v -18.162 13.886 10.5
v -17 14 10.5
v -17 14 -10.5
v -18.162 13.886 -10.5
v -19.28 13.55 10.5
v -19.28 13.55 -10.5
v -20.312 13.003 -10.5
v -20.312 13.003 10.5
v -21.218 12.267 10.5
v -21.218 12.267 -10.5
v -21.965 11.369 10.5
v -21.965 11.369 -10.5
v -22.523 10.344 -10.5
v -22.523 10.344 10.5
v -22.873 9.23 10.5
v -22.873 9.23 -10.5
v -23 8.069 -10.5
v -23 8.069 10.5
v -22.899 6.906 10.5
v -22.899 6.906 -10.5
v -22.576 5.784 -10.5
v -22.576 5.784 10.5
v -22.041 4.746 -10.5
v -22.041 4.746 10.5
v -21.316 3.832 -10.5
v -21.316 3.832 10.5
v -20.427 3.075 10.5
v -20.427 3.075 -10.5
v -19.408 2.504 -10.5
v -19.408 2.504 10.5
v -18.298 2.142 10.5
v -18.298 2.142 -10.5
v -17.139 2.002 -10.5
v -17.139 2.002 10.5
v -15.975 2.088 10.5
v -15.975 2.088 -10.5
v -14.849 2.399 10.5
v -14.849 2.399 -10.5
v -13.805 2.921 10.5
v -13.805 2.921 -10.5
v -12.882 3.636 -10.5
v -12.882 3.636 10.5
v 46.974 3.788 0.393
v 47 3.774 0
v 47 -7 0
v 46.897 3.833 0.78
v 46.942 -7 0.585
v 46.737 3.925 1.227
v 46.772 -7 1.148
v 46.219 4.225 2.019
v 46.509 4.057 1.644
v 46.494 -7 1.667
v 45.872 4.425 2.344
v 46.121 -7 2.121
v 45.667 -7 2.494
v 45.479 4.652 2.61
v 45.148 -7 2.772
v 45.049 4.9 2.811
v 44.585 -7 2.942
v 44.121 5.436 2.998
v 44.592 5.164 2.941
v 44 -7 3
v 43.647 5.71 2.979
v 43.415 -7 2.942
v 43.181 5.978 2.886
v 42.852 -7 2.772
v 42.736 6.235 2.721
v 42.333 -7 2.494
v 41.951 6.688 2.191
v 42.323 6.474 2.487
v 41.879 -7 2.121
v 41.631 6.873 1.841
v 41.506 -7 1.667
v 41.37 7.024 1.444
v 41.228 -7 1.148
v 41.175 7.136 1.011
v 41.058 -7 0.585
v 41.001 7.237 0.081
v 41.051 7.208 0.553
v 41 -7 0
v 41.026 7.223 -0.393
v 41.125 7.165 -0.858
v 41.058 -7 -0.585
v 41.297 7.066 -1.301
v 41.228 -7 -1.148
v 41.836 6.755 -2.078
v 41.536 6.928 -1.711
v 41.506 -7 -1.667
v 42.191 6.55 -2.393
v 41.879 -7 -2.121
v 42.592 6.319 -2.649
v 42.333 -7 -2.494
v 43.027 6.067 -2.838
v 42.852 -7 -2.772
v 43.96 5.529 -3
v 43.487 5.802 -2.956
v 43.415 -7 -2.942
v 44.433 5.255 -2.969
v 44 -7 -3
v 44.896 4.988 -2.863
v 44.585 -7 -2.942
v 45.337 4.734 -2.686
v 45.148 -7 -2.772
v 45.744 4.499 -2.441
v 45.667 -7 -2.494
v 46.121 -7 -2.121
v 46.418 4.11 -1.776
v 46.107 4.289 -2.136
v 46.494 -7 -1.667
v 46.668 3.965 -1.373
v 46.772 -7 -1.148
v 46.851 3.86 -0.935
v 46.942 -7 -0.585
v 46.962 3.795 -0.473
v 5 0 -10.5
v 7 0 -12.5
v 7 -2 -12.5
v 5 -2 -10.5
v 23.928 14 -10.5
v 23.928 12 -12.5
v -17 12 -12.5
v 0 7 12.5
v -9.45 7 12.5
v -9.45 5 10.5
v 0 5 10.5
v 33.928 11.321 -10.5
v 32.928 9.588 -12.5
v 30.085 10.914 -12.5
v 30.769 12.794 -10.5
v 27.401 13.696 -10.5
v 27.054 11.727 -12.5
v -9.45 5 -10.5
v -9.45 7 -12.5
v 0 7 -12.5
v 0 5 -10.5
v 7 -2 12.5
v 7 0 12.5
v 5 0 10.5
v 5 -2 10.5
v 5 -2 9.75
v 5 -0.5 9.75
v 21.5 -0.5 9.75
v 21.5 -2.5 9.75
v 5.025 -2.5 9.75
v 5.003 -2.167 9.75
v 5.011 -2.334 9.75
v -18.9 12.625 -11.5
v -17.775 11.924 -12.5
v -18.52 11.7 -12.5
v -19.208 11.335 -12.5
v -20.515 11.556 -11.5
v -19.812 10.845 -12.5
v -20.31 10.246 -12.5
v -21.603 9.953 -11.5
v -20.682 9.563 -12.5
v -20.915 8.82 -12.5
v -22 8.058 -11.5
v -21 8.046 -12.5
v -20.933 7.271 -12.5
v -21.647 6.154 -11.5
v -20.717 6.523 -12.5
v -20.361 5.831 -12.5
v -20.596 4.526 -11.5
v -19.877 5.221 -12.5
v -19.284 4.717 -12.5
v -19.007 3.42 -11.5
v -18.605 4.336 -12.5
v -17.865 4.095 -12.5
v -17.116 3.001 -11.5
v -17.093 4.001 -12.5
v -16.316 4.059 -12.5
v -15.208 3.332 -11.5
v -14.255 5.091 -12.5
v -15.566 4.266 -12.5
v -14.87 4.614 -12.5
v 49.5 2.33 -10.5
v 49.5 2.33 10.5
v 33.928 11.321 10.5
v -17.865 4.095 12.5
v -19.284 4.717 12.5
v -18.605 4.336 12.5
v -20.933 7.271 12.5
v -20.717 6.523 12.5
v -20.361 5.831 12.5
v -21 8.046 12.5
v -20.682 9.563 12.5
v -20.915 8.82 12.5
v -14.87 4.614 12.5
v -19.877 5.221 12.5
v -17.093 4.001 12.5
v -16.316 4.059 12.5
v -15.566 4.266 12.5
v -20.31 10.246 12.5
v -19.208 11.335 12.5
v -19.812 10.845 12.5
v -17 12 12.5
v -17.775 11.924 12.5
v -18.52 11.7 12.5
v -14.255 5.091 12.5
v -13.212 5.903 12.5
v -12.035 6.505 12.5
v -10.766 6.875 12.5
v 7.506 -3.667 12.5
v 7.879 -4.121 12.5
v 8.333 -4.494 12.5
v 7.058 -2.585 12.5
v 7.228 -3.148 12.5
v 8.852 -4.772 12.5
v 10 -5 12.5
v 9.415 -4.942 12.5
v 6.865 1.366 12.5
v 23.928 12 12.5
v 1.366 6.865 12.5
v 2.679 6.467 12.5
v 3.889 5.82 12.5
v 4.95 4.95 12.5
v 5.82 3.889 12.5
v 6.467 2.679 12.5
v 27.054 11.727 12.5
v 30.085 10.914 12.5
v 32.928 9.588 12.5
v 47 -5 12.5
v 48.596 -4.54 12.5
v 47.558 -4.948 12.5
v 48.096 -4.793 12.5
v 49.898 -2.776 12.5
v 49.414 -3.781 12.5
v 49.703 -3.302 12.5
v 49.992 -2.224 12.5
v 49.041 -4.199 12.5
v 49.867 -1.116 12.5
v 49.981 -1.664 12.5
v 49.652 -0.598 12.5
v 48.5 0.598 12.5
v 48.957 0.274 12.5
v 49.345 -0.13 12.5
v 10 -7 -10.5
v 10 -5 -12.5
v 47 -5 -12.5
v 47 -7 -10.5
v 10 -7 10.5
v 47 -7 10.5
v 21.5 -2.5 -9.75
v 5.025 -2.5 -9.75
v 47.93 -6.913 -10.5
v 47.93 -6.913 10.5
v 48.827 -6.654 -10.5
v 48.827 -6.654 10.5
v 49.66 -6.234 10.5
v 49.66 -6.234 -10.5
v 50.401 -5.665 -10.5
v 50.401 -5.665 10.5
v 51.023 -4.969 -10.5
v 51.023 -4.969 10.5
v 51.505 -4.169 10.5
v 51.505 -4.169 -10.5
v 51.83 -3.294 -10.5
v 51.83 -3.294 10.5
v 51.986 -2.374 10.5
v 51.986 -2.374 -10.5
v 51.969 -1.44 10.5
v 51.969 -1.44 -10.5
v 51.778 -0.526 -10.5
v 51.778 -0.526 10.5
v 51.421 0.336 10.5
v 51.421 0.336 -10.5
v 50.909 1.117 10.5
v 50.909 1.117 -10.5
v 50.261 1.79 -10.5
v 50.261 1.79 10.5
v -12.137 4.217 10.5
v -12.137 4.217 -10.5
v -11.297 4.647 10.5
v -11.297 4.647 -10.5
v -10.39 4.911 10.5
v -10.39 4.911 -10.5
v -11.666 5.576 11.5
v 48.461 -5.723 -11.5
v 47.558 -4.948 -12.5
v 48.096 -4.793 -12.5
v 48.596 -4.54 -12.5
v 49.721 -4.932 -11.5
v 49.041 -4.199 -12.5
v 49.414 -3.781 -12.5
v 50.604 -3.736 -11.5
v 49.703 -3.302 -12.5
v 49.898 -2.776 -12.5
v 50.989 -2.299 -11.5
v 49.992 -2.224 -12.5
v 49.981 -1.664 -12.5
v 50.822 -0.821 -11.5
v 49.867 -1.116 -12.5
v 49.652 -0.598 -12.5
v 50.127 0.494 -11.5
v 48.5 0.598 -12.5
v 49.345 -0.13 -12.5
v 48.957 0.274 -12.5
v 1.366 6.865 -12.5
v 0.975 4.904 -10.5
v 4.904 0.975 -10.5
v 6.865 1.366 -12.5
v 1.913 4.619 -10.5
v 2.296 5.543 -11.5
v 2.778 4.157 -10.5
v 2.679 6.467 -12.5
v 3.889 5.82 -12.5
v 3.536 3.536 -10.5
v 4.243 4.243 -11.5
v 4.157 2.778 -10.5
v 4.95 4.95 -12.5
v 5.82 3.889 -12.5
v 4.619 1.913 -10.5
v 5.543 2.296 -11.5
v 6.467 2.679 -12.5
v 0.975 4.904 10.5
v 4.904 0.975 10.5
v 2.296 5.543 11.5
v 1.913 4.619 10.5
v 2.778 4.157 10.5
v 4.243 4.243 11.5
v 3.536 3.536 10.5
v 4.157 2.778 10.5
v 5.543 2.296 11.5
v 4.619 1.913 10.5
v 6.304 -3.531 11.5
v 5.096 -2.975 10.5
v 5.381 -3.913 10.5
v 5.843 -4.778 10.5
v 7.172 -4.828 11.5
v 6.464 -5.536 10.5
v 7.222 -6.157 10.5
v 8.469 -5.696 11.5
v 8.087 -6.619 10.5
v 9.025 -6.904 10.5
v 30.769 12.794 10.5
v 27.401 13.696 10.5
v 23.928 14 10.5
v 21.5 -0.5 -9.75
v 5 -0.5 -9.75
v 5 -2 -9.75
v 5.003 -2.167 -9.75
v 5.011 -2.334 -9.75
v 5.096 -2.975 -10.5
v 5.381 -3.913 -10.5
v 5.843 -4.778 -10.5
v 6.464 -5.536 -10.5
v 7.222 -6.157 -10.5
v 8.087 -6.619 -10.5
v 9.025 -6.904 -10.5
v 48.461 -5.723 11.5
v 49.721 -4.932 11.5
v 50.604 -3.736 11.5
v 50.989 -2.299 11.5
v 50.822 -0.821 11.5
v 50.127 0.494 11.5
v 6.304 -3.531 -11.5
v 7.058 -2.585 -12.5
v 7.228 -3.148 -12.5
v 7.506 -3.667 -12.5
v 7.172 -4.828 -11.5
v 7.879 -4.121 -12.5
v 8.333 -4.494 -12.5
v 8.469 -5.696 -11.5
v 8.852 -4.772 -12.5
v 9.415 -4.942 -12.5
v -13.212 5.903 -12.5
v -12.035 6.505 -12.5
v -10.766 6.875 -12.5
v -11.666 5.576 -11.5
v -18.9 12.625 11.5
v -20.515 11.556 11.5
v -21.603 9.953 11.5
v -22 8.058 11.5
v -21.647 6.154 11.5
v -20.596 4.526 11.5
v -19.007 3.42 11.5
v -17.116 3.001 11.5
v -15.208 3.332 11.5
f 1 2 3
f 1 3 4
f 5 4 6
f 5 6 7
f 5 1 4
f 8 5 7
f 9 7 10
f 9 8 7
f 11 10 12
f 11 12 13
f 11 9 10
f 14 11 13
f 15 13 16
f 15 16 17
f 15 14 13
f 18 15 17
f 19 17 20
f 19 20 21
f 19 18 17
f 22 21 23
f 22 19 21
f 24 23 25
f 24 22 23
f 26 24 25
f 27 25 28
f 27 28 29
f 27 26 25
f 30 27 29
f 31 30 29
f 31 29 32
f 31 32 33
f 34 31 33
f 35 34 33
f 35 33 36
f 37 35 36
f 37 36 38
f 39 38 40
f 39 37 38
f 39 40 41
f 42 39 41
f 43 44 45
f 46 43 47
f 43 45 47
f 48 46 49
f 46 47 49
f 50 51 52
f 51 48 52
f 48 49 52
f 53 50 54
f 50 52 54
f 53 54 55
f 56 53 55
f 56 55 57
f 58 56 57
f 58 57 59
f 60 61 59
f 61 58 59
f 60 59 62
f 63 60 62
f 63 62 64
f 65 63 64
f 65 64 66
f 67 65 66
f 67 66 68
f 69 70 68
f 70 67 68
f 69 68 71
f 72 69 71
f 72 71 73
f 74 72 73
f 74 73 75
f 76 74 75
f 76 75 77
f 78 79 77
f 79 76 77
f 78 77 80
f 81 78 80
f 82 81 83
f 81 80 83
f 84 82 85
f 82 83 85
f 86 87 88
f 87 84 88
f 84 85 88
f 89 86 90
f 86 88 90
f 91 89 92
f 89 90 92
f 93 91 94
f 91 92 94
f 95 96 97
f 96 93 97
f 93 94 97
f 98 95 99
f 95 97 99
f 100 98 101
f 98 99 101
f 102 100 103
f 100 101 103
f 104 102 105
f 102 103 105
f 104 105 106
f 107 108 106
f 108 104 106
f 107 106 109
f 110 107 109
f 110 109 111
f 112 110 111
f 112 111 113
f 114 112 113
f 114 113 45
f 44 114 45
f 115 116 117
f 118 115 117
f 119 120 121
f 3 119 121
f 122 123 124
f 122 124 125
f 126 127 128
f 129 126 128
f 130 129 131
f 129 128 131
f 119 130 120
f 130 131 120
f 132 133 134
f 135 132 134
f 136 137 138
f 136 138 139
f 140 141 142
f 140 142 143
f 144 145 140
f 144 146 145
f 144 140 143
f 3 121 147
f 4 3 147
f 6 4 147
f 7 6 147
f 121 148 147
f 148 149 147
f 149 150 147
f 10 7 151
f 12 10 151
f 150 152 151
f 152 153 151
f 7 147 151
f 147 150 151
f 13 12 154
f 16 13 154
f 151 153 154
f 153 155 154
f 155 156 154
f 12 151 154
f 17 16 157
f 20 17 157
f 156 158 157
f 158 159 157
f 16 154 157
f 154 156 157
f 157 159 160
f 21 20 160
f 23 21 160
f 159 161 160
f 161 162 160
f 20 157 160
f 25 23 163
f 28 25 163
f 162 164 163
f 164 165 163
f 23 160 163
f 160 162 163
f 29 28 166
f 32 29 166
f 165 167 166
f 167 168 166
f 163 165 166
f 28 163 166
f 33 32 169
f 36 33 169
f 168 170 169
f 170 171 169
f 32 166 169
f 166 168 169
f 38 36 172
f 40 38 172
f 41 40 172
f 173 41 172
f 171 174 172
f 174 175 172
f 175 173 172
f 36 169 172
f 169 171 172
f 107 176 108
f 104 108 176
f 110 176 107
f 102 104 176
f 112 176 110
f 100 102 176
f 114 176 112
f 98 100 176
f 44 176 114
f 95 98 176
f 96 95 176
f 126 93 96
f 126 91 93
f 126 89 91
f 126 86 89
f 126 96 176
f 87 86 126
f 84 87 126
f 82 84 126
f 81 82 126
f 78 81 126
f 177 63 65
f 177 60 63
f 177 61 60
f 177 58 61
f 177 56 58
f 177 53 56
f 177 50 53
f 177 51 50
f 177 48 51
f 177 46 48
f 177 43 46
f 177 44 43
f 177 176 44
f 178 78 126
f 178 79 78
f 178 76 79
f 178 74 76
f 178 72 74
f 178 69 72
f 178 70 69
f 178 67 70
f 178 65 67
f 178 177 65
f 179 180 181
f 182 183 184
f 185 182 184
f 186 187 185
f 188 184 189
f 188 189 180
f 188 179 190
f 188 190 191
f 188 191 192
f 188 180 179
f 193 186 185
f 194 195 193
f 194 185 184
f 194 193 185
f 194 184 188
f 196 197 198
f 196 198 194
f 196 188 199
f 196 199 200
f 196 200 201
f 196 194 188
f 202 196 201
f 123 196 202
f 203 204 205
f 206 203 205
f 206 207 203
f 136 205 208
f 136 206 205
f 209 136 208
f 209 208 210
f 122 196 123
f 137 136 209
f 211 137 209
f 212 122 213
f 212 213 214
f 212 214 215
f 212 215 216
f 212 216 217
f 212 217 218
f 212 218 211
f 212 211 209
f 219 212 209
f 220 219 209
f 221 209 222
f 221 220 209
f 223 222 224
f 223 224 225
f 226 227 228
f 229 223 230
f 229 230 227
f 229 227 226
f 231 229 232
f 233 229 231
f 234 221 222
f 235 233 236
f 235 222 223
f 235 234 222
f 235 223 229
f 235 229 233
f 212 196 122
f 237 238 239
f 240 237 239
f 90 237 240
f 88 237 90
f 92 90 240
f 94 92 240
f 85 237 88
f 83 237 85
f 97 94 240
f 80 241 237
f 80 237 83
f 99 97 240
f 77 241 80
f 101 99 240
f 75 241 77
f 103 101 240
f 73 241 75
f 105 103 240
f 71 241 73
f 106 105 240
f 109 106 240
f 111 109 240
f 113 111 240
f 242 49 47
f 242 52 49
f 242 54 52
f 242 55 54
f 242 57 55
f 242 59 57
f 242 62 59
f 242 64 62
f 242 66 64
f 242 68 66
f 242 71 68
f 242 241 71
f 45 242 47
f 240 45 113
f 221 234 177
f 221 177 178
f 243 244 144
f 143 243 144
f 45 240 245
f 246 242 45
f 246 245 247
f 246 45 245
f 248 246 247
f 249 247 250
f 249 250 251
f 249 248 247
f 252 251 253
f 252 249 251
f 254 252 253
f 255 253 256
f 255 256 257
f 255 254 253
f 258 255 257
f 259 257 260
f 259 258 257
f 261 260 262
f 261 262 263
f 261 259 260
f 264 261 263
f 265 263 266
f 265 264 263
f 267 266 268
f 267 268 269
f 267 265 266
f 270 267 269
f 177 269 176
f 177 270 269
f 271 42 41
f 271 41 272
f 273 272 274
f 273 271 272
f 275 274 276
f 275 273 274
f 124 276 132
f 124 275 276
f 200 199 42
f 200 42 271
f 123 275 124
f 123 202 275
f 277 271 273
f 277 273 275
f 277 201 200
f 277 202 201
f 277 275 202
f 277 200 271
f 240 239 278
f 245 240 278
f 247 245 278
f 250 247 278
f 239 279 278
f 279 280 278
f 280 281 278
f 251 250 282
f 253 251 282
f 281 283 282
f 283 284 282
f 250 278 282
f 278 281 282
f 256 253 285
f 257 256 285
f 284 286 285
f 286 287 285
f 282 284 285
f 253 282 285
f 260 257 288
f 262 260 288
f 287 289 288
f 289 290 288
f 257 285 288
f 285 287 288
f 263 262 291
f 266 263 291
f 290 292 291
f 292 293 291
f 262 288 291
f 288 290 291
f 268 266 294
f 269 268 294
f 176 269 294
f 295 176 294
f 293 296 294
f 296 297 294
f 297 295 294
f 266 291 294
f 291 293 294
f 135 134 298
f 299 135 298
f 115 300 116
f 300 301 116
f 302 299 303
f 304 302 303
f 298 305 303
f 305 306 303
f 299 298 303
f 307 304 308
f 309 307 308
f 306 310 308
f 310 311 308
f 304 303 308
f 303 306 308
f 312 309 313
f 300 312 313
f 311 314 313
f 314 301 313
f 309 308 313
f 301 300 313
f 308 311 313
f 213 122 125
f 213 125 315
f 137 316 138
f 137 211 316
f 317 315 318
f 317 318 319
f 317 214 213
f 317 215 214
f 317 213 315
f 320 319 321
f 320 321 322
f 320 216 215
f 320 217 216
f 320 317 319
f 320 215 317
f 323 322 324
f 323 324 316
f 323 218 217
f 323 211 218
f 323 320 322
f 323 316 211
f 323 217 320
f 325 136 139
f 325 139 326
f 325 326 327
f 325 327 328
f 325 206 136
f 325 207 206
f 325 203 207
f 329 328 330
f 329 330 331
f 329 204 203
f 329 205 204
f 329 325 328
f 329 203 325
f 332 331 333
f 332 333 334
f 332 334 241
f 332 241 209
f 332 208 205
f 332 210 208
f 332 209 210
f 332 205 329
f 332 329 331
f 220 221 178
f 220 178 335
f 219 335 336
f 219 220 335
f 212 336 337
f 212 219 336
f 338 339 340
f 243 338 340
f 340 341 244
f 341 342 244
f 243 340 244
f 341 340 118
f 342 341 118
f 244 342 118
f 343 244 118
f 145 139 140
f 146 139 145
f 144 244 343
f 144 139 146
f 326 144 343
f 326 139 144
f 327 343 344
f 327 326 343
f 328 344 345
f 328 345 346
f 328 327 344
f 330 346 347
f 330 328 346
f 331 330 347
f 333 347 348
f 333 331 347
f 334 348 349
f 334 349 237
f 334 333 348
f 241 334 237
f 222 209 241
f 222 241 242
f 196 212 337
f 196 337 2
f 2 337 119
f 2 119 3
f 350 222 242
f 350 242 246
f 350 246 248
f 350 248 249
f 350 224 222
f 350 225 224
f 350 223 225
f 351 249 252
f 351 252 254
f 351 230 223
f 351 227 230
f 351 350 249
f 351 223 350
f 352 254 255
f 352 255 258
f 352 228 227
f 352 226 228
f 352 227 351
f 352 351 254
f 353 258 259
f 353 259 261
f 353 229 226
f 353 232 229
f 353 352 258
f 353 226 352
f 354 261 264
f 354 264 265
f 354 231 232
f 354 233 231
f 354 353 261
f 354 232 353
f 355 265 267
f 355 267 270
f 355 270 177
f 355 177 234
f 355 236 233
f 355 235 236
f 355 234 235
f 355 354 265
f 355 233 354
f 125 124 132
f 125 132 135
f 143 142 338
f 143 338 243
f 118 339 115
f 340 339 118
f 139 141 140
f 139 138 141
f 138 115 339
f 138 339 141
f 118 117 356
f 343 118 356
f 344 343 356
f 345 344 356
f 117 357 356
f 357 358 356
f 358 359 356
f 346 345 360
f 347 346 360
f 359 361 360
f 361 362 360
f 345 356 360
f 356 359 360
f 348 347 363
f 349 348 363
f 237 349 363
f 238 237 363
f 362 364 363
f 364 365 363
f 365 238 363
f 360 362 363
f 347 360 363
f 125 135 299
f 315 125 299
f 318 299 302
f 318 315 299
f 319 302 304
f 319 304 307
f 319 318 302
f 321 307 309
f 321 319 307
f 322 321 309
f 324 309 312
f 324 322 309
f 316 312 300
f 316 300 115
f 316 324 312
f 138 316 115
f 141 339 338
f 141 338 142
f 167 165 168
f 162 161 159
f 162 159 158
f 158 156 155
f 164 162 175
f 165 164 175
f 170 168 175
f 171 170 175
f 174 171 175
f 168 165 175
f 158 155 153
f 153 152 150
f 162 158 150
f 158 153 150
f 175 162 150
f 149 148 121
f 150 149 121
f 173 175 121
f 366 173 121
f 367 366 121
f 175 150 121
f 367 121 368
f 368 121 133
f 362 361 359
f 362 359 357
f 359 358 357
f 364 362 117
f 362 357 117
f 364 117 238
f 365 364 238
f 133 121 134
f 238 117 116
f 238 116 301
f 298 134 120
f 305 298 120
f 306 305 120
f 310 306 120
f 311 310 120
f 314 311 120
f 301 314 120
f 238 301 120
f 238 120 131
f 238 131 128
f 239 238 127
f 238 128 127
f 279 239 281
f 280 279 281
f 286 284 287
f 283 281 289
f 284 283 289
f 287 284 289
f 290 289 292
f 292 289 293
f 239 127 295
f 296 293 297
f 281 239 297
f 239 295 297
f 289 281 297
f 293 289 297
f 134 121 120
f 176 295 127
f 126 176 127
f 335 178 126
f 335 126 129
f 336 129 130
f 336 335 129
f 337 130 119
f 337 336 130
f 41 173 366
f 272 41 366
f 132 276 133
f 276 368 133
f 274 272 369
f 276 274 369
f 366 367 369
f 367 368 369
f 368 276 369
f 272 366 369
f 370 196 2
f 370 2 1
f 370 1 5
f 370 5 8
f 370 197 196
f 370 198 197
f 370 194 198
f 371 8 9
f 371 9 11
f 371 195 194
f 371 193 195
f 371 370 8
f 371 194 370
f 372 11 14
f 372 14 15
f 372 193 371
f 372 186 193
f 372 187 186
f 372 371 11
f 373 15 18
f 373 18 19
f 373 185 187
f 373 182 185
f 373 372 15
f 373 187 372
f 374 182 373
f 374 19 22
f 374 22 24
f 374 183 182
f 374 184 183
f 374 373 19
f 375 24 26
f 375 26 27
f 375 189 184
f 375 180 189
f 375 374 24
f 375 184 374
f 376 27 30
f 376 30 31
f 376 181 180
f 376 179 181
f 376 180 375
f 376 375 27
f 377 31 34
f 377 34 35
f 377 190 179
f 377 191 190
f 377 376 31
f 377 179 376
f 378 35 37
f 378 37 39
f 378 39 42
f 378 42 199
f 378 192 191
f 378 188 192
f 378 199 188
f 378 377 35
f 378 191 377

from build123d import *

# Parameters (mm, degrees)
F1_DEPTH = 12.5
F2_W     = 2
F2_H     = 19.5
F3_DEPTH = 16.5
F4_SIZE  = 2
F5_R     = 3
F6_DEPTH = 21.001


with BuildPart() as f1:
    # F0 (on Top) → F1 (new body, symmetric)
    with BuildSketch(Plane.XY):
        with BuildLine():
            Line((49.5, 2.330127), (33.928203, 11.320508))
            ThreePointArc((33.928203, 11.320508), (29.104584, 13.318517), (23.928203, 14))
            Line((23.928203, 14), (-17, 14))
            ThreePointArc((-17, 14), (-22.575922, 5.784353), (-12.881908, 3.636364))
            ThreePointArc((-12.881908, 3.636364), (-11.296538, 4.646602), (-9.450166, 5))
            Line((-9.450166, 5), (0, 5))
            ThreePointArc((0, 5), (3.535534, 3.535534), (5, 0))
            Line((5, 0), (5, -2))
            ThreePointArc((5, -2), (6.464466, -5.535534), (10, -7))
            Line((10, -7), (47, -7))
            ThreePointArc((47, -7), (51.829629, -3.294095), (49.5, 2.330127))
        make_face()
    extrude(amount=F1_DEPTH, both=True)

    # F2 (on face) → F3 (cut)
    with BuildSketch(Plane(origin=(5, 0, 0), x_dir=(0, -1, 0), z_dir=(-1, 0, 0))):
        with Locations((1.5, 0)):
            Rectangle(F2_W, F2_H)
    extrude(amount=-F3_DEPTH, mode=Mode.SUBTRACT)

    # F4
    f4_edges = [f1.edges().sort_by_distance(p)[0] for p in [
        (41.714102, 6.825318, 12.5),
        (29.104584, 13.318517, 12.5),
        (3.464102, 14, 12.5),
        (-22.575922, 5.784353, 12.5),
        (-11.296538, 4.646602, 12.5),
        (-4.725083, 5, 12.5),
        (3.535534, 3.535534, 12.5),
        (5, -1, 12.5),
        (6.464466, -5.535534, 12.5),
        (28.5, -7, 12.5),
        (51.829629, -3.294095, 12.5),
        (41.714102, 6.825318, -12.5),
        (29.104584, 13.318517, -12.5),
        (3.464102, 14, -12.5),
        (-22.575922, 5.784353, -12.5),
        (-11.296538, 4.646602, -12.5),
        (-4.725083, 5, -12.5),
        (3.535534, 3.535534, -12.5),
        (5, -1, -12.5),
        (6.464466, -5.535534, -12.5),
        (28.5, -7, -12.5),
        (51.829629, -3.294095, -12.5),
    ]]
    chamfer(f4_edges, length=F4_SIZE)

    # F5 (on face) → F6 (cut, through all)
    with BuildSketch(Plane.XZ.offset(7)):
        with Locations((44, 0)):
            Circle(F5_R)
    extrude(amount=-F6_DEPTH, mode=Mode.SUBTRACT)


solid = f1.part
